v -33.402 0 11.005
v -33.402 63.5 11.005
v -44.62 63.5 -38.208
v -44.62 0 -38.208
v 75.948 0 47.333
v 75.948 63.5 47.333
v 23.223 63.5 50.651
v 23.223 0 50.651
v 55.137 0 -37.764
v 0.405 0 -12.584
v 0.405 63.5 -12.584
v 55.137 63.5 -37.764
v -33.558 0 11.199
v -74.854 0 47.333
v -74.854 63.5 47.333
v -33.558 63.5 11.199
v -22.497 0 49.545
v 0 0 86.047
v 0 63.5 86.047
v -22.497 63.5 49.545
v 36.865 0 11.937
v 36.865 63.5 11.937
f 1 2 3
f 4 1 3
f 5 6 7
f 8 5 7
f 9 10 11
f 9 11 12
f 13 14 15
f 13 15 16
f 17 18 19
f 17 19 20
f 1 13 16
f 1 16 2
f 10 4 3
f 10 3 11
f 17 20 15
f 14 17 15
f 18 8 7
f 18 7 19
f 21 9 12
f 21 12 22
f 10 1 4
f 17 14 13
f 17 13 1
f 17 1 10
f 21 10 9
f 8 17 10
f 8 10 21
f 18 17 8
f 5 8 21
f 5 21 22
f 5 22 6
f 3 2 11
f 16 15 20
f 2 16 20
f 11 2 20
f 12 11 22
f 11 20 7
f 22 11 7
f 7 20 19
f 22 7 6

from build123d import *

# Parameters (mm, degrees)
F1_DEPTH = 63.5


with BuildPart() as f1:
    # F0 (on Front) → F1 (new body)
    with BuildSketch(Plane.XZ):
        Polygon((0, 86.047202), (-22.497155, 49.544945), (-74.853934, 47.332685), (-33.558447, 11.199133), (-33.401991, 11.005372), (-44.619739, -38.207963), (0.404536, -12.584389), (55.13744, -37.764196), (36.865104, 11.936555), (75.948335, 47.332685), (23.222847, 50.651066), align=None)
    extrude(amount=-F1_DEPTH)


solid = f1.part
